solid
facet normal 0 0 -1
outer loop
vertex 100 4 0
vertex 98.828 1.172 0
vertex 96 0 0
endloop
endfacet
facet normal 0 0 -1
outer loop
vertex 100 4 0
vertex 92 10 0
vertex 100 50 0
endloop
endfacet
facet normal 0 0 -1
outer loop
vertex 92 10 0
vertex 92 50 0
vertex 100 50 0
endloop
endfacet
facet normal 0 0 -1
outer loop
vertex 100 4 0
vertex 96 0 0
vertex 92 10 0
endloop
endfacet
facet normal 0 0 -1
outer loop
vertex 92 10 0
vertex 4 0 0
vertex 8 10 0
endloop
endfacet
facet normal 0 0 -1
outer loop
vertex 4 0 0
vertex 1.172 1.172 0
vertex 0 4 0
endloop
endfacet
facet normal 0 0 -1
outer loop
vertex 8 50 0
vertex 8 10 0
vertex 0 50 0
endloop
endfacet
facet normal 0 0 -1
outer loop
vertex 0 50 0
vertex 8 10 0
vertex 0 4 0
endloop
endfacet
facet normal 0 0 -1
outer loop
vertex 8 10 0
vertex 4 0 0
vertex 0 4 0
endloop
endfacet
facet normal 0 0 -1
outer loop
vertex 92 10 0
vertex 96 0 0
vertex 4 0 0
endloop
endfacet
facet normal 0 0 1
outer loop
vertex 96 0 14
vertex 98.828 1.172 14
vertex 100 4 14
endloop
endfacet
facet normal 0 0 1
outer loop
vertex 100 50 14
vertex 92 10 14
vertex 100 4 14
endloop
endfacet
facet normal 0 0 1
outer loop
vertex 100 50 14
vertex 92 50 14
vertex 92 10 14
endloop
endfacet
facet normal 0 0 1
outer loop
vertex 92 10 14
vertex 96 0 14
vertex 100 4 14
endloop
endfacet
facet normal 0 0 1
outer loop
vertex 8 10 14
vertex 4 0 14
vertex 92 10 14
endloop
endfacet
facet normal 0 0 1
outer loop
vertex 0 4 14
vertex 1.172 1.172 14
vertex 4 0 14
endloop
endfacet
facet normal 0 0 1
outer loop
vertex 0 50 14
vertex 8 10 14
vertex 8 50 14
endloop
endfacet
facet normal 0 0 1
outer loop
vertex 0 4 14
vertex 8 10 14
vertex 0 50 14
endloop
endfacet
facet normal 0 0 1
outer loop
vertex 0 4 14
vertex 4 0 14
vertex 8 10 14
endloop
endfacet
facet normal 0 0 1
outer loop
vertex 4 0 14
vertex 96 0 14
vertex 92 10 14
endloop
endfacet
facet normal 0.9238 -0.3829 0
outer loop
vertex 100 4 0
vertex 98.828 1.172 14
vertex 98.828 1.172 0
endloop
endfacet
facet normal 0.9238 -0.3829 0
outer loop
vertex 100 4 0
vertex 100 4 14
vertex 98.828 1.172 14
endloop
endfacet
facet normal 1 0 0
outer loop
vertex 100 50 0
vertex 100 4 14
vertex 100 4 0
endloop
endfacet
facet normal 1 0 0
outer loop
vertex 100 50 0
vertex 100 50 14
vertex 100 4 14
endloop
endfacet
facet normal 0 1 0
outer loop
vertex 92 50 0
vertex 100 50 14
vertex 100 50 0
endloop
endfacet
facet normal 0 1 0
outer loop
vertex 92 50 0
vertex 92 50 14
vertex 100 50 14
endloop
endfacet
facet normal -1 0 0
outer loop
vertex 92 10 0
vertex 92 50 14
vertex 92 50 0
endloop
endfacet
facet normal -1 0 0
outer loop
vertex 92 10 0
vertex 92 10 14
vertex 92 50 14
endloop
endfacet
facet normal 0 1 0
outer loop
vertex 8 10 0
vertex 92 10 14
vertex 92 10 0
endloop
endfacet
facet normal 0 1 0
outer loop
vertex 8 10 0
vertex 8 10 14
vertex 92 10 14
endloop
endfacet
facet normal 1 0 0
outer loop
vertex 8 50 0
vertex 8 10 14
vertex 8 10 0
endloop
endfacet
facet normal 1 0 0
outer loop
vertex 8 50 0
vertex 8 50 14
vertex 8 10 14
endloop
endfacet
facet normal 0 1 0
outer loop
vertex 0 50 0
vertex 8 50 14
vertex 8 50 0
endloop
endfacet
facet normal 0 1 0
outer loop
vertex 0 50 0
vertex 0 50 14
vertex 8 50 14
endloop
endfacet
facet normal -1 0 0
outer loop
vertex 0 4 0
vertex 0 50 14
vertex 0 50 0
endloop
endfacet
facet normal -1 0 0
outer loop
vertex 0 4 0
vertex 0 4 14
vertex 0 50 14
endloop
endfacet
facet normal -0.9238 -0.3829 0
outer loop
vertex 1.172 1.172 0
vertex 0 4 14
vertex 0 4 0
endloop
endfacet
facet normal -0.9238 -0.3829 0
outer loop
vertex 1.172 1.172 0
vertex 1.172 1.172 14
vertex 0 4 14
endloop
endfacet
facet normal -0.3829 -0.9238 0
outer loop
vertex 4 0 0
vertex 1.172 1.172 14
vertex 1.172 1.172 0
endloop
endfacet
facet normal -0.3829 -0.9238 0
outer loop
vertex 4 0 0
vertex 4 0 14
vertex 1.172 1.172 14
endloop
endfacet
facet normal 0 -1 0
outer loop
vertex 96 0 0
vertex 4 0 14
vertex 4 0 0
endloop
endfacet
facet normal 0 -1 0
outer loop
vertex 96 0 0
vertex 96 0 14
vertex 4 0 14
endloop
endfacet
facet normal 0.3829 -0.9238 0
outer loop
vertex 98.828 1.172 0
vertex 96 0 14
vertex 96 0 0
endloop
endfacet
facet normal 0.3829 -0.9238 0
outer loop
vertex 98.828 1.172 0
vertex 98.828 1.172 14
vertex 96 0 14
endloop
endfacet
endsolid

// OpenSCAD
$fn = 32;

// ----------------------------------------------------------------------
// Heat sink frame: 100 x 50 mm frame, 8 mm walls
// ----------------------------------------------------------------------

// --- parameters (mm) ---
profile_height = 14;      // extrusion height
profile_points = 12;      // points of the closed outline

profile = [[0, 4], [1.172, 1.172], [4, 0], [96, 0], [98.828, 1.172], [100, 4], [100, 50], [92, 50], [92, 10], [8, 10], [8, 50], [0, 50]];  // single closed polygon, 12 points, counter clockwise

// --- the one profile operation ---
linear_extrude(height = profile_height) polygon(points = profile);
